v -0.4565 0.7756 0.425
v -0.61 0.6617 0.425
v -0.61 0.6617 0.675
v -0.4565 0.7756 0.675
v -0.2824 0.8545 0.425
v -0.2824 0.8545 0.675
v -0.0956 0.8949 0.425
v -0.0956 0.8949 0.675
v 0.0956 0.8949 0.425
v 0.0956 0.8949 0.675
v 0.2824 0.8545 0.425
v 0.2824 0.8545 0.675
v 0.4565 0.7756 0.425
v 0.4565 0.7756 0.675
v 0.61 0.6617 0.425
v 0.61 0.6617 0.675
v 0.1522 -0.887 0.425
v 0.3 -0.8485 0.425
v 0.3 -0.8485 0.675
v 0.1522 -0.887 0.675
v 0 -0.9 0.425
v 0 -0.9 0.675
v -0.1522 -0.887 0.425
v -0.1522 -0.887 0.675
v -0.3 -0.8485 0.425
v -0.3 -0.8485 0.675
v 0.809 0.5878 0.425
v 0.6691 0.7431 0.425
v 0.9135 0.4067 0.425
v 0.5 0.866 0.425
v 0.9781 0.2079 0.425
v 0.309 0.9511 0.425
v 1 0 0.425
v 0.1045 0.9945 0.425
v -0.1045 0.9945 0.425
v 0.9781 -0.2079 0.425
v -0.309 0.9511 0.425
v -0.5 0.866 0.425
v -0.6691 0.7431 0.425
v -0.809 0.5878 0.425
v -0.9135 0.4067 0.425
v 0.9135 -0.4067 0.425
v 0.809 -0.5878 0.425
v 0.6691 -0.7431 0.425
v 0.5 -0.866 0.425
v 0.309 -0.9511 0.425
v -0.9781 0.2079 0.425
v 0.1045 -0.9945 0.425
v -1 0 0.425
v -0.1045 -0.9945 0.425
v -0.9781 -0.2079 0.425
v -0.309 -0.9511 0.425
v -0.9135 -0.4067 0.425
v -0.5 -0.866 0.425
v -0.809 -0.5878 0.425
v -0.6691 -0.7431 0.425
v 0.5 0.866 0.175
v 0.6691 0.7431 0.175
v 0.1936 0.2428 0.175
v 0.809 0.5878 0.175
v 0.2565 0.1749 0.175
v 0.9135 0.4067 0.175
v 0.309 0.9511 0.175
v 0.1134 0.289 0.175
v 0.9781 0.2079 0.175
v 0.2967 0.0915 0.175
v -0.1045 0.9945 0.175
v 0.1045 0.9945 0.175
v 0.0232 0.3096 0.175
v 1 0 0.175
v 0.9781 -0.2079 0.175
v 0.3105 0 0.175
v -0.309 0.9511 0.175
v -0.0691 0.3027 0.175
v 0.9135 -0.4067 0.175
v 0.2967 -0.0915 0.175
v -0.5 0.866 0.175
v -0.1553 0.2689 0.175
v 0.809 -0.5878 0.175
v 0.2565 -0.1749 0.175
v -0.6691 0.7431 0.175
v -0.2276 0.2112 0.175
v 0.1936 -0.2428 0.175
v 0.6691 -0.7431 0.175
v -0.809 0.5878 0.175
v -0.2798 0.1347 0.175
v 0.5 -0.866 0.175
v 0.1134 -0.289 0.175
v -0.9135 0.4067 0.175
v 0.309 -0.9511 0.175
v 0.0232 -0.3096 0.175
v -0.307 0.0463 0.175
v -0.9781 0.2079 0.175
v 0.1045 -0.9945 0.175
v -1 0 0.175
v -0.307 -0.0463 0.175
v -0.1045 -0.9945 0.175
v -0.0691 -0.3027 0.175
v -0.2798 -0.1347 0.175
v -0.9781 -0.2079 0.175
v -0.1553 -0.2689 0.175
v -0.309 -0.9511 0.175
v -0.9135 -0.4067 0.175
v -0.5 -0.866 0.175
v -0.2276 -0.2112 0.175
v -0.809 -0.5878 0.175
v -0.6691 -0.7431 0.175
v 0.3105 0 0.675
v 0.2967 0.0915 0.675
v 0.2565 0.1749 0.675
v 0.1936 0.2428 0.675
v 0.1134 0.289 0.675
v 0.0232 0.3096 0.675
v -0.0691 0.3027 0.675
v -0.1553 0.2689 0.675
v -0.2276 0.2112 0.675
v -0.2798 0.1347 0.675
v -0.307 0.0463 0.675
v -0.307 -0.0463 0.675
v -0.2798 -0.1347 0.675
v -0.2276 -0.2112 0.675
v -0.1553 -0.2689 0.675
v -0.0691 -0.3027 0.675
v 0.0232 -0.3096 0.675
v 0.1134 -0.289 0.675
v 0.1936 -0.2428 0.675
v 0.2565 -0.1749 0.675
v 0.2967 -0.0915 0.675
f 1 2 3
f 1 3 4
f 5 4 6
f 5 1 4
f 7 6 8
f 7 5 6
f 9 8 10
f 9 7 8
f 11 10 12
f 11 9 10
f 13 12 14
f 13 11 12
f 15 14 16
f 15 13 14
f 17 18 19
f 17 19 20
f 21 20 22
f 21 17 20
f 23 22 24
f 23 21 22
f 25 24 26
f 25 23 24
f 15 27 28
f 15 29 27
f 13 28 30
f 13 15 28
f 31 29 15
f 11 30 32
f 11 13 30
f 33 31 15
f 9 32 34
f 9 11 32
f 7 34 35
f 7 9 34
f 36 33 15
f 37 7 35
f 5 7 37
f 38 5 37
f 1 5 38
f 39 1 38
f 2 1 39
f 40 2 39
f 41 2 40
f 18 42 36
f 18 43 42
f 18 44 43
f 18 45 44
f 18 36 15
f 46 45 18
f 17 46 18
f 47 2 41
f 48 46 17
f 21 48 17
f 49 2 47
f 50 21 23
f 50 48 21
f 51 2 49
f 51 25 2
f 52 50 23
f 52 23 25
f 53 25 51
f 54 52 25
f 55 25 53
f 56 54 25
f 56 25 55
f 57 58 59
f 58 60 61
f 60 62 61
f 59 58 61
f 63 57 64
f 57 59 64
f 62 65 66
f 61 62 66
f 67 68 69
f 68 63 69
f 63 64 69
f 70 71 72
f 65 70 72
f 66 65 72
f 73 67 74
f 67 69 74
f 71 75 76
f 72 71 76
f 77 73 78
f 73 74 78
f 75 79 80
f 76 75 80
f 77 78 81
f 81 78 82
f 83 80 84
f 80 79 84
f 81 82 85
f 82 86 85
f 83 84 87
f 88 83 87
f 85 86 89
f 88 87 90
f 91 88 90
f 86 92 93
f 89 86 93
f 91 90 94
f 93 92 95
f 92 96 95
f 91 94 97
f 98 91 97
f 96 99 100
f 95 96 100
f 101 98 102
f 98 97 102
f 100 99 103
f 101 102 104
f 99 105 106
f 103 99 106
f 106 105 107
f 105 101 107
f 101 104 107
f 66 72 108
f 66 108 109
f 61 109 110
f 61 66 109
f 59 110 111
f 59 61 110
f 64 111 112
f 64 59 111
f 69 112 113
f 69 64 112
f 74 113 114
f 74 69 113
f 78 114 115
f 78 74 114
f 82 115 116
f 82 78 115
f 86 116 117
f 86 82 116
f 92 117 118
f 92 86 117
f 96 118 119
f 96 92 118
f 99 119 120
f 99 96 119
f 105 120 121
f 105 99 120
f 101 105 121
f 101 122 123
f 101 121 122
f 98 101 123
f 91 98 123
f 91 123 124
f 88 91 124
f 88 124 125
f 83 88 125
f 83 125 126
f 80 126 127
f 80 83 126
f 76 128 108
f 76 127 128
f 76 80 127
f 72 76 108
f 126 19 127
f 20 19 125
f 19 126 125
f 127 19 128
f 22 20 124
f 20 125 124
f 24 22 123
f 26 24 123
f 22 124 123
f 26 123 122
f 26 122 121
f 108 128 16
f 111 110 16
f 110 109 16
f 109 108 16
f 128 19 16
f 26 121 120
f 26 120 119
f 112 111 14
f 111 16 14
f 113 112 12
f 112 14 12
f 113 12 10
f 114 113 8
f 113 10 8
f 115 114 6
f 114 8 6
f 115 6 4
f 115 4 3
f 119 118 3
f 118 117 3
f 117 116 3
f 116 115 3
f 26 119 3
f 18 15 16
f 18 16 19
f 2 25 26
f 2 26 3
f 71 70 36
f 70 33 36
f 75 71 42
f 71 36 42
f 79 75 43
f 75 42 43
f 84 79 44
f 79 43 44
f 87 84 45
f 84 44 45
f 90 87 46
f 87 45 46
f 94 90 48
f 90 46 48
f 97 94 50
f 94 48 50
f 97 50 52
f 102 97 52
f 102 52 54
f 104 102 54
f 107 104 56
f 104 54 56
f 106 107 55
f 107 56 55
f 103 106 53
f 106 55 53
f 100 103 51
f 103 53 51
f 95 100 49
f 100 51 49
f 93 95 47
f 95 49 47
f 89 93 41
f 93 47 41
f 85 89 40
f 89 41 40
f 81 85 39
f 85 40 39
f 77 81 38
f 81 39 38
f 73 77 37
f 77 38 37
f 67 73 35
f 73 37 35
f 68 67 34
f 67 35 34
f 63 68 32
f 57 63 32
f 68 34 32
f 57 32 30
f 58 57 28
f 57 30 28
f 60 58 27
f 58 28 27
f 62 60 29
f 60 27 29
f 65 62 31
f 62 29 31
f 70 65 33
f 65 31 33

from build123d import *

# Parameters (mm, degrees)
SKETCH1_W           = 1
SKETCH1_H           = 0.25
BOSS_EXTRUDE1_DEPTH = 0.25
CUT_EXTRUDE1_REACH  = 2.675
SKETCH3_R           = 0.3105


with BuildPart() as part:
    # Sketch1 → Revolve1 (revolve)
    with BuildSketch(Plane.XZ):
        with Locations((0.5, 0.3)):
            Rectangle(SKETCH1_W, SKETCH1_H)
    revolve(axis=Axis((0, 0, 0.425), (0, 0, -1)))

    # Sketch2 → Boss-Extrude1 (add)
    with BuildSketch(Plane.XY.offset(0.425)):
        with BuildLine():
            Line((0.610011397, 0.661729625), (0.3, -0.848528137))
            ThreePointArc((0.3, -0.848528137), (0, -0.9), (-0.3, -0.848528137))
            Line((-0.3, -0.848528137), (-0.610011397, 0.661729625))
            ThreePointArc((-0.610011397, 0.661729625), (0, 0.9), (0.610011397, 0.661729625))
        make_face()
    extrude(amount=BOSS_EXTRUDE1_DEPTH)

    # Sketch3 → Cut-Extrude1 (cut, up to next)
    with BuildSketch(Plane.XY, mode=Mode.PRIVATE) as cut_extrude1_sk1:
        Circle(SKETCH3_R)
    cut_extrude1_tool1 = extrude(cut_extrude1_sk1.sketch, amount=CUT_EXTRUDE1_REACH, mode=Mode.PRIVATE) & part.part
    add(cut_extrude1_tool1.solids().sort_by_distance((0, 0, 0))[0], mode=Mode.SUBTRACT)


solid = part.part
